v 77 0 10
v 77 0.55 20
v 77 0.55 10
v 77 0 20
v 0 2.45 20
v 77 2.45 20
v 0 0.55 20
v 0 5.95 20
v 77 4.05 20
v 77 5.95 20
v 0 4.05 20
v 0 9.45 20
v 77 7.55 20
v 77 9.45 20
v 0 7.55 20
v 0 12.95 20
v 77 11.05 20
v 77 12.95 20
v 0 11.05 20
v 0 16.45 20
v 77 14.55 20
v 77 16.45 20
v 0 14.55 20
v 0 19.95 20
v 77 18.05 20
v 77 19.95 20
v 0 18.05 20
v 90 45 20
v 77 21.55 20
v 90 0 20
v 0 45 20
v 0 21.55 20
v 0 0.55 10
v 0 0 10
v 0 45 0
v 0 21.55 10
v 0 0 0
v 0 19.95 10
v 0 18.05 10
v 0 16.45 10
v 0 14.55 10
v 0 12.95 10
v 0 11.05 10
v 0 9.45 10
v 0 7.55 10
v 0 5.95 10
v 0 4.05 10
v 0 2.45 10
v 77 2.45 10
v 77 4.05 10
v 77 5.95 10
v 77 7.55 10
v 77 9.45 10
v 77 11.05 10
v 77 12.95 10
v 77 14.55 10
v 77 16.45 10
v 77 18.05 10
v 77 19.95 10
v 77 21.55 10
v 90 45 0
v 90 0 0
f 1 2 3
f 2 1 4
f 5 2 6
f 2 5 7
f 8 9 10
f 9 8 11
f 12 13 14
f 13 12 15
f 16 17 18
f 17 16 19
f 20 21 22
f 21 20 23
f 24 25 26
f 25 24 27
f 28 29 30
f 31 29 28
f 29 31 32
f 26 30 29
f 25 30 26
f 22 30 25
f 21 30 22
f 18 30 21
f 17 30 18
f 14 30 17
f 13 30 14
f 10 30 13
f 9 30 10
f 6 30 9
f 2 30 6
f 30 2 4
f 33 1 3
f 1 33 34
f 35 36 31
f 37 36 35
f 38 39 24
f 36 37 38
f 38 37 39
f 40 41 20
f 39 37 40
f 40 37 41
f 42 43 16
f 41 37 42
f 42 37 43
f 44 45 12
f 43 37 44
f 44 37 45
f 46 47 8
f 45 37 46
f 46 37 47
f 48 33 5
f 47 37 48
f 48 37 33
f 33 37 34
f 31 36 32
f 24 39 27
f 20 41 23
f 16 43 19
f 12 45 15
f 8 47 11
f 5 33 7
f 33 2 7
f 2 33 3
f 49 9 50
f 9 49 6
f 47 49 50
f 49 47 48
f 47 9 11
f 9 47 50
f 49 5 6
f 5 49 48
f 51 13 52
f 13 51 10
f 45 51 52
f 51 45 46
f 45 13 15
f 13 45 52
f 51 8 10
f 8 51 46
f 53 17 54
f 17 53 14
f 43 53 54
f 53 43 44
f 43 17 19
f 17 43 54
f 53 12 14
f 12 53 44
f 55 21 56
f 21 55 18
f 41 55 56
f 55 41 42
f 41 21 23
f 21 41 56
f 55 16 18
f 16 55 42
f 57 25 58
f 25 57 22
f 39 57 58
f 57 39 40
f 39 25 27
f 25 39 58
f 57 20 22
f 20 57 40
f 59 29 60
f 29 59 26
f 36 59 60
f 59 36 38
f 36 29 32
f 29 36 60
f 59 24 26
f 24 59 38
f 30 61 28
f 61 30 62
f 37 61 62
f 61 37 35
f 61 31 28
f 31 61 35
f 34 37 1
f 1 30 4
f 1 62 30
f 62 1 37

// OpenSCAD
// =============================================================================
// Drying Rack for Microscope Slides
// Designed to hold 10 microscope slides standing upright on their long edge.
// Base dimensions: 90mm (X) x 45mm (Y) x 20mm (Z).
// Slots run along X, centered in the block.
// =============================================================================

$fn = 64; // Ensure smooth curves for any rounded corners if modified later

// --- User Dimensions (Measured with calipers) ---
BLOCK_LENGTH_X   = 90;  // Total length of the base block
BLOCK_WIDTH_Y    = 45;  // Total width of the base block
BLOCK_HEIGHT_Z   = 20;  // Height of the base block

SLIDE_LONG       = 75;  // Long dimension of a microscope slide (X axis)
// Note: Slides stand on their long edge, so they occupy ~1mm in Z.

SLOT_LENGTH_X    = 77;  // Length of each slot along X
SLOT_WIDTH_Y     = 1.6; // Width of each slot across Y
SLOT_DEPTH_Z     = 10;  // Depth of the cut into the block (from top)

SPACING_CENTRE   = 3.5; // Centre-to-centre distance between slots in Y
NUM_SLOTS        = 10;  // Number of slides to hold

// --- Calculated Variables ---
// Calculate total width occupied by slots and gaps to ensure symmetry
TOTAL_SLOT_WIDTH_SPAN = (NUM_SLOTS * SPACING_CENTRE) + SLOT_WIDTH_Y; 

// Offset from centerline for the first slot in Y direction
CENTER_OFFSET_Y  = (BLOCK_WIDTH_Y - TOTAL_SLOT_WIDTH_SPAN) / 2.0;

// --- Geometry Construction ---

difference() {
    // 1. Create the solid base block
    translate([0, 0, 0]) 
        cube([BLOCK_LENGTH_X, BLOCK_WIDTH_Y, BLOCK_HEIGHT_Z]);

    // 2. Cut the slots into the top face (Z = BLOCK_HEIGHT_Z)
    // Slots run along X. They are spaced in Y.
    
    for(i = [-(NUM_SLOTS-1)/2 : NUM_SLOTS/2 - 0.5]) { 
        // Calculate position of each slot center relative to block center
        
        // Determine the offset from global zero based on loop index i
        // If we want centers at y_center, y_center + spacing...
        // Let's calculate absolute Y positions for the slots centered in the block width
        
        current_slot_y = CENTER_OFFSET_Y + (i * SPACING_CENTRE);

        translate([0, current_slot_y, BLOCK_HEIGHT_Z - SLOT_DEPTH_Z]) 
            cube([SLOT_LENGTH_X, SLOT_WIDTH_Y, SLOT_DEPTH_Z]);
    }
}
